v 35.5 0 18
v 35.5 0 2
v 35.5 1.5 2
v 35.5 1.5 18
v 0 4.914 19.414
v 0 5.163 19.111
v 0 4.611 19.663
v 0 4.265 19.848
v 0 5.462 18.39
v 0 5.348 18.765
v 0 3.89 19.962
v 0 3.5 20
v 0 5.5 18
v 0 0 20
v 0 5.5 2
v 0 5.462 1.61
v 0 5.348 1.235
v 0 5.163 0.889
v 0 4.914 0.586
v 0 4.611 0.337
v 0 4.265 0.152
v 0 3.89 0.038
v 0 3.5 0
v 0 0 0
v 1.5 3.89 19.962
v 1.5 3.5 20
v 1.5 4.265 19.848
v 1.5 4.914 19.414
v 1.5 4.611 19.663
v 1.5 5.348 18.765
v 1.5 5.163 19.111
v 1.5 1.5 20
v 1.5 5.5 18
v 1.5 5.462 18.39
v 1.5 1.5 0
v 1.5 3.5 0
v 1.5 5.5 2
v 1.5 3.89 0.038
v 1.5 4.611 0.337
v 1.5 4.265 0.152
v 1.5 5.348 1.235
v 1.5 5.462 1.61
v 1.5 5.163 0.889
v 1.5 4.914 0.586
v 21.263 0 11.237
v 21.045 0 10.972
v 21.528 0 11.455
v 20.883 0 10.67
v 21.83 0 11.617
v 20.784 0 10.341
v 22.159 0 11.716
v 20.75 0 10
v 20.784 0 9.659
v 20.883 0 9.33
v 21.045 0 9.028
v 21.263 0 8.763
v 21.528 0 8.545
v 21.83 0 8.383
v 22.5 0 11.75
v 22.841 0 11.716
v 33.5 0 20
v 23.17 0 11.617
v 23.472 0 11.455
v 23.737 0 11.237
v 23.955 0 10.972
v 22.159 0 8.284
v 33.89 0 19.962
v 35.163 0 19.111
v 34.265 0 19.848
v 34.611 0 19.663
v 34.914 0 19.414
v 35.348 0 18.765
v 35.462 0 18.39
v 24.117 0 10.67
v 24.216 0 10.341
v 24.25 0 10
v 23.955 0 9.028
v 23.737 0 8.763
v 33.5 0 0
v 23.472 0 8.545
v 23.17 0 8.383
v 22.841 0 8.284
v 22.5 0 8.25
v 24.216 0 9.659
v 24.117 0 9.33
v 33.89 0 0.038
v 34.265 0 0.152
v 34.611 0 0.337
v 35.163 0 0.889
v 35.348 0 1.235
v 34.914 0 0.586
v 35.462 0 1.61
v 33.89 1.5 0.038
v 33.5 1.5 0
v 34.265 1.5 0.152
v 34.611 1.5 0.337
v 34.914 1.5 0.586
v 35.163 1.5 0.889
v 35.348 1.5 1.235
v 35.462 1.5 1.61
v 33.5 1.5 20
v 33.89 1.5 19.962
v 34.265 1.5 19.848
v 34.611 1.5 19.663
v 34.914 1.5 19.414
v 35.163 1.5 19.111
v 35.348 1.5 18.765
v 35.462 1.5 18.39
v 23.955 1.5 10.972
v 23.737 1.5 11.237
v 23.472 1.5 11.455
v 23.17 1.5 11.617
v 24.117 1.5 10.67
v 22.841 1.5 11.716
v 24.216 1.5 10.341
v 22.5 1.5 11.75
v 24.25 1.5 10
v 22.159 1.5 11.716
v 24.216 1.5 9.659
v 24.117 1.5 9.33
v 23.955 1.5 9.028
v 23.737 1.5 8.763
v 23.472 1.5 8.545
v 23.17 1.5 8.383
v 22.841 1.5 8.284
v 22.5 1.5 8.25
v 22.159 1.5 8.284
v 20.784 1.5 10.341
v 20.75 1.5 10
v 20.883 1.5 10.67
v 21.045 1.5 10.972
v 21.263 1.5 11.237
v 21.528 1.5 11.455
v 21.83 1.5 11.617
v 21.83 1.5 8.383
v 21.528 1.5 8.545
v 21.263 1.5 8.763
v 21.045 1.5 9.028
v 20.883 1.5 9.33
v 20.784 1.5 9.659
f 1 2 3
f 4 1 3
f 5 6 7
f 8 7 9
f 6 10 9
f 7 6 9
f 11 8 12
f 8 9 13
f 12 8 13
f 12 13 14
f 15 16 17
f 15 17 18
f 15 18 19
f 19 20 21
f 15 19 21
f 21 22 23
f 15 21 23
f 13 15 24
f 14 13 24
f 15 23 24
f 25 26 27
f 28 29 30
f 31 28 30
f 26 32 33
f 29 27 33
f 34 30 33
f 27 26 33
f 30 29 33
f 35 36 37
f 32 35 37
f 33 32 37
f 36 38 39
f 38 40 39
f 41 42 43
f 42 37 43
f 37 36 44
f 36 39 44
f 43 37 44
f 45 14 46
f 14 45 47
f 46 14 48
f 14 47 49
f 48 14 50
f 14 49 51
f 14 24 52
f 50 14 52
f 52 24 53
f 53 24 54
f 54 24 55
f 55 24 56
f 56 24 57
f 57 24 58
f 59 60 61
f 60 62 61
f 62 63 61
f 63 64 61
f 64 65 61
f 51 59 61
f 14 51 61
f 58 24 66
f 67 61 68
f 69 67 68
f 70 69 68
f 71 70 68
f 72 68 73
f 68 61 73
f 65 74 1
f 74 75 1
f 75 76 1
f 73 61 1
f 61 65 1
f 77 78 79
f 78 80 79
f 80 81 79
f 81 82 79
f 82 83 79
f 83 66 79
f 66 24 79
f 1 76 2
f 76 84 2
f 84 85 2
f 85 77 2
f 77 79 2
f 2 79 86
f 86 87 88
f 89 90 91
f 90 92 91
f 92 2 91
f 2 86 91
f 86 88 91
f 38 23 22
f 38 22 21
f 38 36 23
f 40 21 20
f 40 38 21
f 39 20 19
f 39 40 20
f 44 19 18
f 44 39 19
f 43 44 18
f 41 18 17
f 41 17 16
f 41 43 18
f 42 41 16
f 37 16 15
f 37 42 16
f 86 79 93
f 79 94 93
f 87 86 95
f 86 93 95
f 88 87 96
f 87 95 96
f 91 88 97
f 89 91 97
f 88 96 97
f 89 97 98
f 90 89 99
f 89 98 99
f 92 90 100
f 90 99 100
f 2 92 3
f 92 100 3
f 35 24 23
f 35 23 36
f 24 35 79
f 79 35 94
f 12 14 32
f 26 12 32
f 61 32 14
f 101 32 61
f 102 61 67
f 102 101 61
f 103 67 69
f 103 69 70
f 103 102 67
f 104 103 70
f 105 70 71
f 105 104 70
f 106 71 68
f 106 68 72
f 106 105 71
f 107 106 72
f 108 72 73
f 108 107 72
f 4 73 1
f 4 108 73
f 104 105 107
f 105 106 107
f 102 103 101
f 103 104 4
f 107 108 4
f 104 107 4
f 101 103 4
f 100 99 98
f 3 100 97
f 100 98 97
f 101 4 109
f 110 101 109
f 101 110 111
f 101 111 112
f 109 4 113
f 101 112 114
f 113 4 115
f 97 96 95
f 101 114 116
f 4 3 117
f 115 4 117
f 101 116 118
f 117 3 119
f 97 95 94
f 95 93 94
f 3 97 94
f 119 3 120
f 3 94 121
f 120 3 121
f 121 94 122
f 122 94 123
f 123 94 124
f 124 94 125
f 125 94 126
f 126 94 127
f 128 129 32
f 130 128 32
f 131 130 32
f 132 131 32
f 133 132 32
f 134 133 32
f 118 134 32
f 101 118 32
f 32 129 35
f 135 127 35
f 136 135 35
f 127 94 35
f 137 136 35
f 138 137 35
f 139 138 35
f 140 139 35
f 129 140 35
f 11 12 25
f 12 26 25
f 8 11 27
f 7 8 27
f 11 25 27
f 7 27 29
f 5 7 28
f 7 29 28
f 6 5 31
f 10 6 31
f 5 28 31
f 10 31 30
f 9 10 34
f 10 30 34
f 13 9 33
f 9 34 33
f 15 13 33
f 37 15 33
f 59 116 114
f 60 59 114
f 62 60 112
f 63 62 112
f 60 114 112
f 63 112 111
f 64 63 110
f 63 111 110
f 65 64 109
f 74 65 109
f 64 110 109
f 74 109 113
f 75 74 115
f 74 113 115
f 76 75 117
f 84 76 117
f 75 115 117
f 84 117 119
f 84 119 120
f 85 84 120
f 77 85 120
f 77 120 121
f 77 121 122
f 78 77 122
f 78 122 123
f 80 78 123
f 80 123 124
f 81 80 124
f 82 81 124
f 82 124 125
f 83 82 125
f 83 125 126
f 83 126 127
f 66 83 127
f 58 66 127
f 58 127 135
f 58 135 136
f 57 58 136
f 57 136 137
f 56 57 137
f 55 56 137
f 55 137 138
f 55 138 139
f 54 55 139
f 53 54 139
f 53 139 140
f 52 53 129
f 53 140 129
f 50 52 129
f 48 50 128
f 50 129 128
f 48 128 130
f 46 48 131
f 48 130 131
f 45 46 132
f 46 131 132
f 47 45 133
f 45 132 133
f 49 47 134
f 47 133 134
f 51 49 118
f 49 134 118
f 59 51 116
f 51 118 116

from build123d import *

# Parameters (mm, degrees)
EXTRU_MINCE1_DEPTH      = 20
ESQUISSE2_R             = 1.75
ENL_V_MAT_EXTRU_1_DEPTH = 45.544921147
ESQUISSE3_W             = 1.5
ESQUISSE3_H             = 14
ENL_V_MAT_EXTRU_2_DEPTH = 46.171893916
CONG_1_R                = 2


with BuildPart() as part:
    # Esquisse1 → Extru.-Mince1 (new body)
    with BuildSketch(Plane.XY):
        Polygon((0, 19.5), (0, 0), (35.5, 0), (35.5, 1.5), (1.5, 1.5), (1.5, 19.5), align=None)
    extrude(amount=EXTRU_MINCE1_DEPTH)

    # Esquisse2 → Enlèv. mat.-Extru.1 (cut, through all)
    with BuildSketch(Plane(origin=(0, 1.5, 0), x_dir=(1, 0, 0), z_dir=(0, 1, 0))):
        with Locations(Location((22.5, -10, 0), (0, 0, 270))):
            Circle(ESQUISSE2_R)
    extrude(amount=-ENL_V_MAT_EXTRU_1_DEPTH, mode=Mode.SUBTRACT)

    # Esquisse3 → Enlèv. mat.-Extru.2 (cut, through all)
    with BuildSketch(Plane.XY.offset(20)):
        with Locations((0.75, 12.5)):
            Rectangle(ESQUISSE3_W, ESQUISSE3_H)
    extrude(amount=-ENL_V_MAT_EXTRU_2_DEPTH, mode=Mode.SUBTRACT)

    # Congé1
    cong_1_edges = [part.edges().sort_by_distance(p)[0] for p in [
        (0.75, 5.5, 0),
        (0.75, 5.5, 20),
        (35.5, 0.75, 0),
        (35.5, 0.75, 20),
    ]]
    fillet(cong_1_edges, radius=CONG_1_R)


solid = part.part
